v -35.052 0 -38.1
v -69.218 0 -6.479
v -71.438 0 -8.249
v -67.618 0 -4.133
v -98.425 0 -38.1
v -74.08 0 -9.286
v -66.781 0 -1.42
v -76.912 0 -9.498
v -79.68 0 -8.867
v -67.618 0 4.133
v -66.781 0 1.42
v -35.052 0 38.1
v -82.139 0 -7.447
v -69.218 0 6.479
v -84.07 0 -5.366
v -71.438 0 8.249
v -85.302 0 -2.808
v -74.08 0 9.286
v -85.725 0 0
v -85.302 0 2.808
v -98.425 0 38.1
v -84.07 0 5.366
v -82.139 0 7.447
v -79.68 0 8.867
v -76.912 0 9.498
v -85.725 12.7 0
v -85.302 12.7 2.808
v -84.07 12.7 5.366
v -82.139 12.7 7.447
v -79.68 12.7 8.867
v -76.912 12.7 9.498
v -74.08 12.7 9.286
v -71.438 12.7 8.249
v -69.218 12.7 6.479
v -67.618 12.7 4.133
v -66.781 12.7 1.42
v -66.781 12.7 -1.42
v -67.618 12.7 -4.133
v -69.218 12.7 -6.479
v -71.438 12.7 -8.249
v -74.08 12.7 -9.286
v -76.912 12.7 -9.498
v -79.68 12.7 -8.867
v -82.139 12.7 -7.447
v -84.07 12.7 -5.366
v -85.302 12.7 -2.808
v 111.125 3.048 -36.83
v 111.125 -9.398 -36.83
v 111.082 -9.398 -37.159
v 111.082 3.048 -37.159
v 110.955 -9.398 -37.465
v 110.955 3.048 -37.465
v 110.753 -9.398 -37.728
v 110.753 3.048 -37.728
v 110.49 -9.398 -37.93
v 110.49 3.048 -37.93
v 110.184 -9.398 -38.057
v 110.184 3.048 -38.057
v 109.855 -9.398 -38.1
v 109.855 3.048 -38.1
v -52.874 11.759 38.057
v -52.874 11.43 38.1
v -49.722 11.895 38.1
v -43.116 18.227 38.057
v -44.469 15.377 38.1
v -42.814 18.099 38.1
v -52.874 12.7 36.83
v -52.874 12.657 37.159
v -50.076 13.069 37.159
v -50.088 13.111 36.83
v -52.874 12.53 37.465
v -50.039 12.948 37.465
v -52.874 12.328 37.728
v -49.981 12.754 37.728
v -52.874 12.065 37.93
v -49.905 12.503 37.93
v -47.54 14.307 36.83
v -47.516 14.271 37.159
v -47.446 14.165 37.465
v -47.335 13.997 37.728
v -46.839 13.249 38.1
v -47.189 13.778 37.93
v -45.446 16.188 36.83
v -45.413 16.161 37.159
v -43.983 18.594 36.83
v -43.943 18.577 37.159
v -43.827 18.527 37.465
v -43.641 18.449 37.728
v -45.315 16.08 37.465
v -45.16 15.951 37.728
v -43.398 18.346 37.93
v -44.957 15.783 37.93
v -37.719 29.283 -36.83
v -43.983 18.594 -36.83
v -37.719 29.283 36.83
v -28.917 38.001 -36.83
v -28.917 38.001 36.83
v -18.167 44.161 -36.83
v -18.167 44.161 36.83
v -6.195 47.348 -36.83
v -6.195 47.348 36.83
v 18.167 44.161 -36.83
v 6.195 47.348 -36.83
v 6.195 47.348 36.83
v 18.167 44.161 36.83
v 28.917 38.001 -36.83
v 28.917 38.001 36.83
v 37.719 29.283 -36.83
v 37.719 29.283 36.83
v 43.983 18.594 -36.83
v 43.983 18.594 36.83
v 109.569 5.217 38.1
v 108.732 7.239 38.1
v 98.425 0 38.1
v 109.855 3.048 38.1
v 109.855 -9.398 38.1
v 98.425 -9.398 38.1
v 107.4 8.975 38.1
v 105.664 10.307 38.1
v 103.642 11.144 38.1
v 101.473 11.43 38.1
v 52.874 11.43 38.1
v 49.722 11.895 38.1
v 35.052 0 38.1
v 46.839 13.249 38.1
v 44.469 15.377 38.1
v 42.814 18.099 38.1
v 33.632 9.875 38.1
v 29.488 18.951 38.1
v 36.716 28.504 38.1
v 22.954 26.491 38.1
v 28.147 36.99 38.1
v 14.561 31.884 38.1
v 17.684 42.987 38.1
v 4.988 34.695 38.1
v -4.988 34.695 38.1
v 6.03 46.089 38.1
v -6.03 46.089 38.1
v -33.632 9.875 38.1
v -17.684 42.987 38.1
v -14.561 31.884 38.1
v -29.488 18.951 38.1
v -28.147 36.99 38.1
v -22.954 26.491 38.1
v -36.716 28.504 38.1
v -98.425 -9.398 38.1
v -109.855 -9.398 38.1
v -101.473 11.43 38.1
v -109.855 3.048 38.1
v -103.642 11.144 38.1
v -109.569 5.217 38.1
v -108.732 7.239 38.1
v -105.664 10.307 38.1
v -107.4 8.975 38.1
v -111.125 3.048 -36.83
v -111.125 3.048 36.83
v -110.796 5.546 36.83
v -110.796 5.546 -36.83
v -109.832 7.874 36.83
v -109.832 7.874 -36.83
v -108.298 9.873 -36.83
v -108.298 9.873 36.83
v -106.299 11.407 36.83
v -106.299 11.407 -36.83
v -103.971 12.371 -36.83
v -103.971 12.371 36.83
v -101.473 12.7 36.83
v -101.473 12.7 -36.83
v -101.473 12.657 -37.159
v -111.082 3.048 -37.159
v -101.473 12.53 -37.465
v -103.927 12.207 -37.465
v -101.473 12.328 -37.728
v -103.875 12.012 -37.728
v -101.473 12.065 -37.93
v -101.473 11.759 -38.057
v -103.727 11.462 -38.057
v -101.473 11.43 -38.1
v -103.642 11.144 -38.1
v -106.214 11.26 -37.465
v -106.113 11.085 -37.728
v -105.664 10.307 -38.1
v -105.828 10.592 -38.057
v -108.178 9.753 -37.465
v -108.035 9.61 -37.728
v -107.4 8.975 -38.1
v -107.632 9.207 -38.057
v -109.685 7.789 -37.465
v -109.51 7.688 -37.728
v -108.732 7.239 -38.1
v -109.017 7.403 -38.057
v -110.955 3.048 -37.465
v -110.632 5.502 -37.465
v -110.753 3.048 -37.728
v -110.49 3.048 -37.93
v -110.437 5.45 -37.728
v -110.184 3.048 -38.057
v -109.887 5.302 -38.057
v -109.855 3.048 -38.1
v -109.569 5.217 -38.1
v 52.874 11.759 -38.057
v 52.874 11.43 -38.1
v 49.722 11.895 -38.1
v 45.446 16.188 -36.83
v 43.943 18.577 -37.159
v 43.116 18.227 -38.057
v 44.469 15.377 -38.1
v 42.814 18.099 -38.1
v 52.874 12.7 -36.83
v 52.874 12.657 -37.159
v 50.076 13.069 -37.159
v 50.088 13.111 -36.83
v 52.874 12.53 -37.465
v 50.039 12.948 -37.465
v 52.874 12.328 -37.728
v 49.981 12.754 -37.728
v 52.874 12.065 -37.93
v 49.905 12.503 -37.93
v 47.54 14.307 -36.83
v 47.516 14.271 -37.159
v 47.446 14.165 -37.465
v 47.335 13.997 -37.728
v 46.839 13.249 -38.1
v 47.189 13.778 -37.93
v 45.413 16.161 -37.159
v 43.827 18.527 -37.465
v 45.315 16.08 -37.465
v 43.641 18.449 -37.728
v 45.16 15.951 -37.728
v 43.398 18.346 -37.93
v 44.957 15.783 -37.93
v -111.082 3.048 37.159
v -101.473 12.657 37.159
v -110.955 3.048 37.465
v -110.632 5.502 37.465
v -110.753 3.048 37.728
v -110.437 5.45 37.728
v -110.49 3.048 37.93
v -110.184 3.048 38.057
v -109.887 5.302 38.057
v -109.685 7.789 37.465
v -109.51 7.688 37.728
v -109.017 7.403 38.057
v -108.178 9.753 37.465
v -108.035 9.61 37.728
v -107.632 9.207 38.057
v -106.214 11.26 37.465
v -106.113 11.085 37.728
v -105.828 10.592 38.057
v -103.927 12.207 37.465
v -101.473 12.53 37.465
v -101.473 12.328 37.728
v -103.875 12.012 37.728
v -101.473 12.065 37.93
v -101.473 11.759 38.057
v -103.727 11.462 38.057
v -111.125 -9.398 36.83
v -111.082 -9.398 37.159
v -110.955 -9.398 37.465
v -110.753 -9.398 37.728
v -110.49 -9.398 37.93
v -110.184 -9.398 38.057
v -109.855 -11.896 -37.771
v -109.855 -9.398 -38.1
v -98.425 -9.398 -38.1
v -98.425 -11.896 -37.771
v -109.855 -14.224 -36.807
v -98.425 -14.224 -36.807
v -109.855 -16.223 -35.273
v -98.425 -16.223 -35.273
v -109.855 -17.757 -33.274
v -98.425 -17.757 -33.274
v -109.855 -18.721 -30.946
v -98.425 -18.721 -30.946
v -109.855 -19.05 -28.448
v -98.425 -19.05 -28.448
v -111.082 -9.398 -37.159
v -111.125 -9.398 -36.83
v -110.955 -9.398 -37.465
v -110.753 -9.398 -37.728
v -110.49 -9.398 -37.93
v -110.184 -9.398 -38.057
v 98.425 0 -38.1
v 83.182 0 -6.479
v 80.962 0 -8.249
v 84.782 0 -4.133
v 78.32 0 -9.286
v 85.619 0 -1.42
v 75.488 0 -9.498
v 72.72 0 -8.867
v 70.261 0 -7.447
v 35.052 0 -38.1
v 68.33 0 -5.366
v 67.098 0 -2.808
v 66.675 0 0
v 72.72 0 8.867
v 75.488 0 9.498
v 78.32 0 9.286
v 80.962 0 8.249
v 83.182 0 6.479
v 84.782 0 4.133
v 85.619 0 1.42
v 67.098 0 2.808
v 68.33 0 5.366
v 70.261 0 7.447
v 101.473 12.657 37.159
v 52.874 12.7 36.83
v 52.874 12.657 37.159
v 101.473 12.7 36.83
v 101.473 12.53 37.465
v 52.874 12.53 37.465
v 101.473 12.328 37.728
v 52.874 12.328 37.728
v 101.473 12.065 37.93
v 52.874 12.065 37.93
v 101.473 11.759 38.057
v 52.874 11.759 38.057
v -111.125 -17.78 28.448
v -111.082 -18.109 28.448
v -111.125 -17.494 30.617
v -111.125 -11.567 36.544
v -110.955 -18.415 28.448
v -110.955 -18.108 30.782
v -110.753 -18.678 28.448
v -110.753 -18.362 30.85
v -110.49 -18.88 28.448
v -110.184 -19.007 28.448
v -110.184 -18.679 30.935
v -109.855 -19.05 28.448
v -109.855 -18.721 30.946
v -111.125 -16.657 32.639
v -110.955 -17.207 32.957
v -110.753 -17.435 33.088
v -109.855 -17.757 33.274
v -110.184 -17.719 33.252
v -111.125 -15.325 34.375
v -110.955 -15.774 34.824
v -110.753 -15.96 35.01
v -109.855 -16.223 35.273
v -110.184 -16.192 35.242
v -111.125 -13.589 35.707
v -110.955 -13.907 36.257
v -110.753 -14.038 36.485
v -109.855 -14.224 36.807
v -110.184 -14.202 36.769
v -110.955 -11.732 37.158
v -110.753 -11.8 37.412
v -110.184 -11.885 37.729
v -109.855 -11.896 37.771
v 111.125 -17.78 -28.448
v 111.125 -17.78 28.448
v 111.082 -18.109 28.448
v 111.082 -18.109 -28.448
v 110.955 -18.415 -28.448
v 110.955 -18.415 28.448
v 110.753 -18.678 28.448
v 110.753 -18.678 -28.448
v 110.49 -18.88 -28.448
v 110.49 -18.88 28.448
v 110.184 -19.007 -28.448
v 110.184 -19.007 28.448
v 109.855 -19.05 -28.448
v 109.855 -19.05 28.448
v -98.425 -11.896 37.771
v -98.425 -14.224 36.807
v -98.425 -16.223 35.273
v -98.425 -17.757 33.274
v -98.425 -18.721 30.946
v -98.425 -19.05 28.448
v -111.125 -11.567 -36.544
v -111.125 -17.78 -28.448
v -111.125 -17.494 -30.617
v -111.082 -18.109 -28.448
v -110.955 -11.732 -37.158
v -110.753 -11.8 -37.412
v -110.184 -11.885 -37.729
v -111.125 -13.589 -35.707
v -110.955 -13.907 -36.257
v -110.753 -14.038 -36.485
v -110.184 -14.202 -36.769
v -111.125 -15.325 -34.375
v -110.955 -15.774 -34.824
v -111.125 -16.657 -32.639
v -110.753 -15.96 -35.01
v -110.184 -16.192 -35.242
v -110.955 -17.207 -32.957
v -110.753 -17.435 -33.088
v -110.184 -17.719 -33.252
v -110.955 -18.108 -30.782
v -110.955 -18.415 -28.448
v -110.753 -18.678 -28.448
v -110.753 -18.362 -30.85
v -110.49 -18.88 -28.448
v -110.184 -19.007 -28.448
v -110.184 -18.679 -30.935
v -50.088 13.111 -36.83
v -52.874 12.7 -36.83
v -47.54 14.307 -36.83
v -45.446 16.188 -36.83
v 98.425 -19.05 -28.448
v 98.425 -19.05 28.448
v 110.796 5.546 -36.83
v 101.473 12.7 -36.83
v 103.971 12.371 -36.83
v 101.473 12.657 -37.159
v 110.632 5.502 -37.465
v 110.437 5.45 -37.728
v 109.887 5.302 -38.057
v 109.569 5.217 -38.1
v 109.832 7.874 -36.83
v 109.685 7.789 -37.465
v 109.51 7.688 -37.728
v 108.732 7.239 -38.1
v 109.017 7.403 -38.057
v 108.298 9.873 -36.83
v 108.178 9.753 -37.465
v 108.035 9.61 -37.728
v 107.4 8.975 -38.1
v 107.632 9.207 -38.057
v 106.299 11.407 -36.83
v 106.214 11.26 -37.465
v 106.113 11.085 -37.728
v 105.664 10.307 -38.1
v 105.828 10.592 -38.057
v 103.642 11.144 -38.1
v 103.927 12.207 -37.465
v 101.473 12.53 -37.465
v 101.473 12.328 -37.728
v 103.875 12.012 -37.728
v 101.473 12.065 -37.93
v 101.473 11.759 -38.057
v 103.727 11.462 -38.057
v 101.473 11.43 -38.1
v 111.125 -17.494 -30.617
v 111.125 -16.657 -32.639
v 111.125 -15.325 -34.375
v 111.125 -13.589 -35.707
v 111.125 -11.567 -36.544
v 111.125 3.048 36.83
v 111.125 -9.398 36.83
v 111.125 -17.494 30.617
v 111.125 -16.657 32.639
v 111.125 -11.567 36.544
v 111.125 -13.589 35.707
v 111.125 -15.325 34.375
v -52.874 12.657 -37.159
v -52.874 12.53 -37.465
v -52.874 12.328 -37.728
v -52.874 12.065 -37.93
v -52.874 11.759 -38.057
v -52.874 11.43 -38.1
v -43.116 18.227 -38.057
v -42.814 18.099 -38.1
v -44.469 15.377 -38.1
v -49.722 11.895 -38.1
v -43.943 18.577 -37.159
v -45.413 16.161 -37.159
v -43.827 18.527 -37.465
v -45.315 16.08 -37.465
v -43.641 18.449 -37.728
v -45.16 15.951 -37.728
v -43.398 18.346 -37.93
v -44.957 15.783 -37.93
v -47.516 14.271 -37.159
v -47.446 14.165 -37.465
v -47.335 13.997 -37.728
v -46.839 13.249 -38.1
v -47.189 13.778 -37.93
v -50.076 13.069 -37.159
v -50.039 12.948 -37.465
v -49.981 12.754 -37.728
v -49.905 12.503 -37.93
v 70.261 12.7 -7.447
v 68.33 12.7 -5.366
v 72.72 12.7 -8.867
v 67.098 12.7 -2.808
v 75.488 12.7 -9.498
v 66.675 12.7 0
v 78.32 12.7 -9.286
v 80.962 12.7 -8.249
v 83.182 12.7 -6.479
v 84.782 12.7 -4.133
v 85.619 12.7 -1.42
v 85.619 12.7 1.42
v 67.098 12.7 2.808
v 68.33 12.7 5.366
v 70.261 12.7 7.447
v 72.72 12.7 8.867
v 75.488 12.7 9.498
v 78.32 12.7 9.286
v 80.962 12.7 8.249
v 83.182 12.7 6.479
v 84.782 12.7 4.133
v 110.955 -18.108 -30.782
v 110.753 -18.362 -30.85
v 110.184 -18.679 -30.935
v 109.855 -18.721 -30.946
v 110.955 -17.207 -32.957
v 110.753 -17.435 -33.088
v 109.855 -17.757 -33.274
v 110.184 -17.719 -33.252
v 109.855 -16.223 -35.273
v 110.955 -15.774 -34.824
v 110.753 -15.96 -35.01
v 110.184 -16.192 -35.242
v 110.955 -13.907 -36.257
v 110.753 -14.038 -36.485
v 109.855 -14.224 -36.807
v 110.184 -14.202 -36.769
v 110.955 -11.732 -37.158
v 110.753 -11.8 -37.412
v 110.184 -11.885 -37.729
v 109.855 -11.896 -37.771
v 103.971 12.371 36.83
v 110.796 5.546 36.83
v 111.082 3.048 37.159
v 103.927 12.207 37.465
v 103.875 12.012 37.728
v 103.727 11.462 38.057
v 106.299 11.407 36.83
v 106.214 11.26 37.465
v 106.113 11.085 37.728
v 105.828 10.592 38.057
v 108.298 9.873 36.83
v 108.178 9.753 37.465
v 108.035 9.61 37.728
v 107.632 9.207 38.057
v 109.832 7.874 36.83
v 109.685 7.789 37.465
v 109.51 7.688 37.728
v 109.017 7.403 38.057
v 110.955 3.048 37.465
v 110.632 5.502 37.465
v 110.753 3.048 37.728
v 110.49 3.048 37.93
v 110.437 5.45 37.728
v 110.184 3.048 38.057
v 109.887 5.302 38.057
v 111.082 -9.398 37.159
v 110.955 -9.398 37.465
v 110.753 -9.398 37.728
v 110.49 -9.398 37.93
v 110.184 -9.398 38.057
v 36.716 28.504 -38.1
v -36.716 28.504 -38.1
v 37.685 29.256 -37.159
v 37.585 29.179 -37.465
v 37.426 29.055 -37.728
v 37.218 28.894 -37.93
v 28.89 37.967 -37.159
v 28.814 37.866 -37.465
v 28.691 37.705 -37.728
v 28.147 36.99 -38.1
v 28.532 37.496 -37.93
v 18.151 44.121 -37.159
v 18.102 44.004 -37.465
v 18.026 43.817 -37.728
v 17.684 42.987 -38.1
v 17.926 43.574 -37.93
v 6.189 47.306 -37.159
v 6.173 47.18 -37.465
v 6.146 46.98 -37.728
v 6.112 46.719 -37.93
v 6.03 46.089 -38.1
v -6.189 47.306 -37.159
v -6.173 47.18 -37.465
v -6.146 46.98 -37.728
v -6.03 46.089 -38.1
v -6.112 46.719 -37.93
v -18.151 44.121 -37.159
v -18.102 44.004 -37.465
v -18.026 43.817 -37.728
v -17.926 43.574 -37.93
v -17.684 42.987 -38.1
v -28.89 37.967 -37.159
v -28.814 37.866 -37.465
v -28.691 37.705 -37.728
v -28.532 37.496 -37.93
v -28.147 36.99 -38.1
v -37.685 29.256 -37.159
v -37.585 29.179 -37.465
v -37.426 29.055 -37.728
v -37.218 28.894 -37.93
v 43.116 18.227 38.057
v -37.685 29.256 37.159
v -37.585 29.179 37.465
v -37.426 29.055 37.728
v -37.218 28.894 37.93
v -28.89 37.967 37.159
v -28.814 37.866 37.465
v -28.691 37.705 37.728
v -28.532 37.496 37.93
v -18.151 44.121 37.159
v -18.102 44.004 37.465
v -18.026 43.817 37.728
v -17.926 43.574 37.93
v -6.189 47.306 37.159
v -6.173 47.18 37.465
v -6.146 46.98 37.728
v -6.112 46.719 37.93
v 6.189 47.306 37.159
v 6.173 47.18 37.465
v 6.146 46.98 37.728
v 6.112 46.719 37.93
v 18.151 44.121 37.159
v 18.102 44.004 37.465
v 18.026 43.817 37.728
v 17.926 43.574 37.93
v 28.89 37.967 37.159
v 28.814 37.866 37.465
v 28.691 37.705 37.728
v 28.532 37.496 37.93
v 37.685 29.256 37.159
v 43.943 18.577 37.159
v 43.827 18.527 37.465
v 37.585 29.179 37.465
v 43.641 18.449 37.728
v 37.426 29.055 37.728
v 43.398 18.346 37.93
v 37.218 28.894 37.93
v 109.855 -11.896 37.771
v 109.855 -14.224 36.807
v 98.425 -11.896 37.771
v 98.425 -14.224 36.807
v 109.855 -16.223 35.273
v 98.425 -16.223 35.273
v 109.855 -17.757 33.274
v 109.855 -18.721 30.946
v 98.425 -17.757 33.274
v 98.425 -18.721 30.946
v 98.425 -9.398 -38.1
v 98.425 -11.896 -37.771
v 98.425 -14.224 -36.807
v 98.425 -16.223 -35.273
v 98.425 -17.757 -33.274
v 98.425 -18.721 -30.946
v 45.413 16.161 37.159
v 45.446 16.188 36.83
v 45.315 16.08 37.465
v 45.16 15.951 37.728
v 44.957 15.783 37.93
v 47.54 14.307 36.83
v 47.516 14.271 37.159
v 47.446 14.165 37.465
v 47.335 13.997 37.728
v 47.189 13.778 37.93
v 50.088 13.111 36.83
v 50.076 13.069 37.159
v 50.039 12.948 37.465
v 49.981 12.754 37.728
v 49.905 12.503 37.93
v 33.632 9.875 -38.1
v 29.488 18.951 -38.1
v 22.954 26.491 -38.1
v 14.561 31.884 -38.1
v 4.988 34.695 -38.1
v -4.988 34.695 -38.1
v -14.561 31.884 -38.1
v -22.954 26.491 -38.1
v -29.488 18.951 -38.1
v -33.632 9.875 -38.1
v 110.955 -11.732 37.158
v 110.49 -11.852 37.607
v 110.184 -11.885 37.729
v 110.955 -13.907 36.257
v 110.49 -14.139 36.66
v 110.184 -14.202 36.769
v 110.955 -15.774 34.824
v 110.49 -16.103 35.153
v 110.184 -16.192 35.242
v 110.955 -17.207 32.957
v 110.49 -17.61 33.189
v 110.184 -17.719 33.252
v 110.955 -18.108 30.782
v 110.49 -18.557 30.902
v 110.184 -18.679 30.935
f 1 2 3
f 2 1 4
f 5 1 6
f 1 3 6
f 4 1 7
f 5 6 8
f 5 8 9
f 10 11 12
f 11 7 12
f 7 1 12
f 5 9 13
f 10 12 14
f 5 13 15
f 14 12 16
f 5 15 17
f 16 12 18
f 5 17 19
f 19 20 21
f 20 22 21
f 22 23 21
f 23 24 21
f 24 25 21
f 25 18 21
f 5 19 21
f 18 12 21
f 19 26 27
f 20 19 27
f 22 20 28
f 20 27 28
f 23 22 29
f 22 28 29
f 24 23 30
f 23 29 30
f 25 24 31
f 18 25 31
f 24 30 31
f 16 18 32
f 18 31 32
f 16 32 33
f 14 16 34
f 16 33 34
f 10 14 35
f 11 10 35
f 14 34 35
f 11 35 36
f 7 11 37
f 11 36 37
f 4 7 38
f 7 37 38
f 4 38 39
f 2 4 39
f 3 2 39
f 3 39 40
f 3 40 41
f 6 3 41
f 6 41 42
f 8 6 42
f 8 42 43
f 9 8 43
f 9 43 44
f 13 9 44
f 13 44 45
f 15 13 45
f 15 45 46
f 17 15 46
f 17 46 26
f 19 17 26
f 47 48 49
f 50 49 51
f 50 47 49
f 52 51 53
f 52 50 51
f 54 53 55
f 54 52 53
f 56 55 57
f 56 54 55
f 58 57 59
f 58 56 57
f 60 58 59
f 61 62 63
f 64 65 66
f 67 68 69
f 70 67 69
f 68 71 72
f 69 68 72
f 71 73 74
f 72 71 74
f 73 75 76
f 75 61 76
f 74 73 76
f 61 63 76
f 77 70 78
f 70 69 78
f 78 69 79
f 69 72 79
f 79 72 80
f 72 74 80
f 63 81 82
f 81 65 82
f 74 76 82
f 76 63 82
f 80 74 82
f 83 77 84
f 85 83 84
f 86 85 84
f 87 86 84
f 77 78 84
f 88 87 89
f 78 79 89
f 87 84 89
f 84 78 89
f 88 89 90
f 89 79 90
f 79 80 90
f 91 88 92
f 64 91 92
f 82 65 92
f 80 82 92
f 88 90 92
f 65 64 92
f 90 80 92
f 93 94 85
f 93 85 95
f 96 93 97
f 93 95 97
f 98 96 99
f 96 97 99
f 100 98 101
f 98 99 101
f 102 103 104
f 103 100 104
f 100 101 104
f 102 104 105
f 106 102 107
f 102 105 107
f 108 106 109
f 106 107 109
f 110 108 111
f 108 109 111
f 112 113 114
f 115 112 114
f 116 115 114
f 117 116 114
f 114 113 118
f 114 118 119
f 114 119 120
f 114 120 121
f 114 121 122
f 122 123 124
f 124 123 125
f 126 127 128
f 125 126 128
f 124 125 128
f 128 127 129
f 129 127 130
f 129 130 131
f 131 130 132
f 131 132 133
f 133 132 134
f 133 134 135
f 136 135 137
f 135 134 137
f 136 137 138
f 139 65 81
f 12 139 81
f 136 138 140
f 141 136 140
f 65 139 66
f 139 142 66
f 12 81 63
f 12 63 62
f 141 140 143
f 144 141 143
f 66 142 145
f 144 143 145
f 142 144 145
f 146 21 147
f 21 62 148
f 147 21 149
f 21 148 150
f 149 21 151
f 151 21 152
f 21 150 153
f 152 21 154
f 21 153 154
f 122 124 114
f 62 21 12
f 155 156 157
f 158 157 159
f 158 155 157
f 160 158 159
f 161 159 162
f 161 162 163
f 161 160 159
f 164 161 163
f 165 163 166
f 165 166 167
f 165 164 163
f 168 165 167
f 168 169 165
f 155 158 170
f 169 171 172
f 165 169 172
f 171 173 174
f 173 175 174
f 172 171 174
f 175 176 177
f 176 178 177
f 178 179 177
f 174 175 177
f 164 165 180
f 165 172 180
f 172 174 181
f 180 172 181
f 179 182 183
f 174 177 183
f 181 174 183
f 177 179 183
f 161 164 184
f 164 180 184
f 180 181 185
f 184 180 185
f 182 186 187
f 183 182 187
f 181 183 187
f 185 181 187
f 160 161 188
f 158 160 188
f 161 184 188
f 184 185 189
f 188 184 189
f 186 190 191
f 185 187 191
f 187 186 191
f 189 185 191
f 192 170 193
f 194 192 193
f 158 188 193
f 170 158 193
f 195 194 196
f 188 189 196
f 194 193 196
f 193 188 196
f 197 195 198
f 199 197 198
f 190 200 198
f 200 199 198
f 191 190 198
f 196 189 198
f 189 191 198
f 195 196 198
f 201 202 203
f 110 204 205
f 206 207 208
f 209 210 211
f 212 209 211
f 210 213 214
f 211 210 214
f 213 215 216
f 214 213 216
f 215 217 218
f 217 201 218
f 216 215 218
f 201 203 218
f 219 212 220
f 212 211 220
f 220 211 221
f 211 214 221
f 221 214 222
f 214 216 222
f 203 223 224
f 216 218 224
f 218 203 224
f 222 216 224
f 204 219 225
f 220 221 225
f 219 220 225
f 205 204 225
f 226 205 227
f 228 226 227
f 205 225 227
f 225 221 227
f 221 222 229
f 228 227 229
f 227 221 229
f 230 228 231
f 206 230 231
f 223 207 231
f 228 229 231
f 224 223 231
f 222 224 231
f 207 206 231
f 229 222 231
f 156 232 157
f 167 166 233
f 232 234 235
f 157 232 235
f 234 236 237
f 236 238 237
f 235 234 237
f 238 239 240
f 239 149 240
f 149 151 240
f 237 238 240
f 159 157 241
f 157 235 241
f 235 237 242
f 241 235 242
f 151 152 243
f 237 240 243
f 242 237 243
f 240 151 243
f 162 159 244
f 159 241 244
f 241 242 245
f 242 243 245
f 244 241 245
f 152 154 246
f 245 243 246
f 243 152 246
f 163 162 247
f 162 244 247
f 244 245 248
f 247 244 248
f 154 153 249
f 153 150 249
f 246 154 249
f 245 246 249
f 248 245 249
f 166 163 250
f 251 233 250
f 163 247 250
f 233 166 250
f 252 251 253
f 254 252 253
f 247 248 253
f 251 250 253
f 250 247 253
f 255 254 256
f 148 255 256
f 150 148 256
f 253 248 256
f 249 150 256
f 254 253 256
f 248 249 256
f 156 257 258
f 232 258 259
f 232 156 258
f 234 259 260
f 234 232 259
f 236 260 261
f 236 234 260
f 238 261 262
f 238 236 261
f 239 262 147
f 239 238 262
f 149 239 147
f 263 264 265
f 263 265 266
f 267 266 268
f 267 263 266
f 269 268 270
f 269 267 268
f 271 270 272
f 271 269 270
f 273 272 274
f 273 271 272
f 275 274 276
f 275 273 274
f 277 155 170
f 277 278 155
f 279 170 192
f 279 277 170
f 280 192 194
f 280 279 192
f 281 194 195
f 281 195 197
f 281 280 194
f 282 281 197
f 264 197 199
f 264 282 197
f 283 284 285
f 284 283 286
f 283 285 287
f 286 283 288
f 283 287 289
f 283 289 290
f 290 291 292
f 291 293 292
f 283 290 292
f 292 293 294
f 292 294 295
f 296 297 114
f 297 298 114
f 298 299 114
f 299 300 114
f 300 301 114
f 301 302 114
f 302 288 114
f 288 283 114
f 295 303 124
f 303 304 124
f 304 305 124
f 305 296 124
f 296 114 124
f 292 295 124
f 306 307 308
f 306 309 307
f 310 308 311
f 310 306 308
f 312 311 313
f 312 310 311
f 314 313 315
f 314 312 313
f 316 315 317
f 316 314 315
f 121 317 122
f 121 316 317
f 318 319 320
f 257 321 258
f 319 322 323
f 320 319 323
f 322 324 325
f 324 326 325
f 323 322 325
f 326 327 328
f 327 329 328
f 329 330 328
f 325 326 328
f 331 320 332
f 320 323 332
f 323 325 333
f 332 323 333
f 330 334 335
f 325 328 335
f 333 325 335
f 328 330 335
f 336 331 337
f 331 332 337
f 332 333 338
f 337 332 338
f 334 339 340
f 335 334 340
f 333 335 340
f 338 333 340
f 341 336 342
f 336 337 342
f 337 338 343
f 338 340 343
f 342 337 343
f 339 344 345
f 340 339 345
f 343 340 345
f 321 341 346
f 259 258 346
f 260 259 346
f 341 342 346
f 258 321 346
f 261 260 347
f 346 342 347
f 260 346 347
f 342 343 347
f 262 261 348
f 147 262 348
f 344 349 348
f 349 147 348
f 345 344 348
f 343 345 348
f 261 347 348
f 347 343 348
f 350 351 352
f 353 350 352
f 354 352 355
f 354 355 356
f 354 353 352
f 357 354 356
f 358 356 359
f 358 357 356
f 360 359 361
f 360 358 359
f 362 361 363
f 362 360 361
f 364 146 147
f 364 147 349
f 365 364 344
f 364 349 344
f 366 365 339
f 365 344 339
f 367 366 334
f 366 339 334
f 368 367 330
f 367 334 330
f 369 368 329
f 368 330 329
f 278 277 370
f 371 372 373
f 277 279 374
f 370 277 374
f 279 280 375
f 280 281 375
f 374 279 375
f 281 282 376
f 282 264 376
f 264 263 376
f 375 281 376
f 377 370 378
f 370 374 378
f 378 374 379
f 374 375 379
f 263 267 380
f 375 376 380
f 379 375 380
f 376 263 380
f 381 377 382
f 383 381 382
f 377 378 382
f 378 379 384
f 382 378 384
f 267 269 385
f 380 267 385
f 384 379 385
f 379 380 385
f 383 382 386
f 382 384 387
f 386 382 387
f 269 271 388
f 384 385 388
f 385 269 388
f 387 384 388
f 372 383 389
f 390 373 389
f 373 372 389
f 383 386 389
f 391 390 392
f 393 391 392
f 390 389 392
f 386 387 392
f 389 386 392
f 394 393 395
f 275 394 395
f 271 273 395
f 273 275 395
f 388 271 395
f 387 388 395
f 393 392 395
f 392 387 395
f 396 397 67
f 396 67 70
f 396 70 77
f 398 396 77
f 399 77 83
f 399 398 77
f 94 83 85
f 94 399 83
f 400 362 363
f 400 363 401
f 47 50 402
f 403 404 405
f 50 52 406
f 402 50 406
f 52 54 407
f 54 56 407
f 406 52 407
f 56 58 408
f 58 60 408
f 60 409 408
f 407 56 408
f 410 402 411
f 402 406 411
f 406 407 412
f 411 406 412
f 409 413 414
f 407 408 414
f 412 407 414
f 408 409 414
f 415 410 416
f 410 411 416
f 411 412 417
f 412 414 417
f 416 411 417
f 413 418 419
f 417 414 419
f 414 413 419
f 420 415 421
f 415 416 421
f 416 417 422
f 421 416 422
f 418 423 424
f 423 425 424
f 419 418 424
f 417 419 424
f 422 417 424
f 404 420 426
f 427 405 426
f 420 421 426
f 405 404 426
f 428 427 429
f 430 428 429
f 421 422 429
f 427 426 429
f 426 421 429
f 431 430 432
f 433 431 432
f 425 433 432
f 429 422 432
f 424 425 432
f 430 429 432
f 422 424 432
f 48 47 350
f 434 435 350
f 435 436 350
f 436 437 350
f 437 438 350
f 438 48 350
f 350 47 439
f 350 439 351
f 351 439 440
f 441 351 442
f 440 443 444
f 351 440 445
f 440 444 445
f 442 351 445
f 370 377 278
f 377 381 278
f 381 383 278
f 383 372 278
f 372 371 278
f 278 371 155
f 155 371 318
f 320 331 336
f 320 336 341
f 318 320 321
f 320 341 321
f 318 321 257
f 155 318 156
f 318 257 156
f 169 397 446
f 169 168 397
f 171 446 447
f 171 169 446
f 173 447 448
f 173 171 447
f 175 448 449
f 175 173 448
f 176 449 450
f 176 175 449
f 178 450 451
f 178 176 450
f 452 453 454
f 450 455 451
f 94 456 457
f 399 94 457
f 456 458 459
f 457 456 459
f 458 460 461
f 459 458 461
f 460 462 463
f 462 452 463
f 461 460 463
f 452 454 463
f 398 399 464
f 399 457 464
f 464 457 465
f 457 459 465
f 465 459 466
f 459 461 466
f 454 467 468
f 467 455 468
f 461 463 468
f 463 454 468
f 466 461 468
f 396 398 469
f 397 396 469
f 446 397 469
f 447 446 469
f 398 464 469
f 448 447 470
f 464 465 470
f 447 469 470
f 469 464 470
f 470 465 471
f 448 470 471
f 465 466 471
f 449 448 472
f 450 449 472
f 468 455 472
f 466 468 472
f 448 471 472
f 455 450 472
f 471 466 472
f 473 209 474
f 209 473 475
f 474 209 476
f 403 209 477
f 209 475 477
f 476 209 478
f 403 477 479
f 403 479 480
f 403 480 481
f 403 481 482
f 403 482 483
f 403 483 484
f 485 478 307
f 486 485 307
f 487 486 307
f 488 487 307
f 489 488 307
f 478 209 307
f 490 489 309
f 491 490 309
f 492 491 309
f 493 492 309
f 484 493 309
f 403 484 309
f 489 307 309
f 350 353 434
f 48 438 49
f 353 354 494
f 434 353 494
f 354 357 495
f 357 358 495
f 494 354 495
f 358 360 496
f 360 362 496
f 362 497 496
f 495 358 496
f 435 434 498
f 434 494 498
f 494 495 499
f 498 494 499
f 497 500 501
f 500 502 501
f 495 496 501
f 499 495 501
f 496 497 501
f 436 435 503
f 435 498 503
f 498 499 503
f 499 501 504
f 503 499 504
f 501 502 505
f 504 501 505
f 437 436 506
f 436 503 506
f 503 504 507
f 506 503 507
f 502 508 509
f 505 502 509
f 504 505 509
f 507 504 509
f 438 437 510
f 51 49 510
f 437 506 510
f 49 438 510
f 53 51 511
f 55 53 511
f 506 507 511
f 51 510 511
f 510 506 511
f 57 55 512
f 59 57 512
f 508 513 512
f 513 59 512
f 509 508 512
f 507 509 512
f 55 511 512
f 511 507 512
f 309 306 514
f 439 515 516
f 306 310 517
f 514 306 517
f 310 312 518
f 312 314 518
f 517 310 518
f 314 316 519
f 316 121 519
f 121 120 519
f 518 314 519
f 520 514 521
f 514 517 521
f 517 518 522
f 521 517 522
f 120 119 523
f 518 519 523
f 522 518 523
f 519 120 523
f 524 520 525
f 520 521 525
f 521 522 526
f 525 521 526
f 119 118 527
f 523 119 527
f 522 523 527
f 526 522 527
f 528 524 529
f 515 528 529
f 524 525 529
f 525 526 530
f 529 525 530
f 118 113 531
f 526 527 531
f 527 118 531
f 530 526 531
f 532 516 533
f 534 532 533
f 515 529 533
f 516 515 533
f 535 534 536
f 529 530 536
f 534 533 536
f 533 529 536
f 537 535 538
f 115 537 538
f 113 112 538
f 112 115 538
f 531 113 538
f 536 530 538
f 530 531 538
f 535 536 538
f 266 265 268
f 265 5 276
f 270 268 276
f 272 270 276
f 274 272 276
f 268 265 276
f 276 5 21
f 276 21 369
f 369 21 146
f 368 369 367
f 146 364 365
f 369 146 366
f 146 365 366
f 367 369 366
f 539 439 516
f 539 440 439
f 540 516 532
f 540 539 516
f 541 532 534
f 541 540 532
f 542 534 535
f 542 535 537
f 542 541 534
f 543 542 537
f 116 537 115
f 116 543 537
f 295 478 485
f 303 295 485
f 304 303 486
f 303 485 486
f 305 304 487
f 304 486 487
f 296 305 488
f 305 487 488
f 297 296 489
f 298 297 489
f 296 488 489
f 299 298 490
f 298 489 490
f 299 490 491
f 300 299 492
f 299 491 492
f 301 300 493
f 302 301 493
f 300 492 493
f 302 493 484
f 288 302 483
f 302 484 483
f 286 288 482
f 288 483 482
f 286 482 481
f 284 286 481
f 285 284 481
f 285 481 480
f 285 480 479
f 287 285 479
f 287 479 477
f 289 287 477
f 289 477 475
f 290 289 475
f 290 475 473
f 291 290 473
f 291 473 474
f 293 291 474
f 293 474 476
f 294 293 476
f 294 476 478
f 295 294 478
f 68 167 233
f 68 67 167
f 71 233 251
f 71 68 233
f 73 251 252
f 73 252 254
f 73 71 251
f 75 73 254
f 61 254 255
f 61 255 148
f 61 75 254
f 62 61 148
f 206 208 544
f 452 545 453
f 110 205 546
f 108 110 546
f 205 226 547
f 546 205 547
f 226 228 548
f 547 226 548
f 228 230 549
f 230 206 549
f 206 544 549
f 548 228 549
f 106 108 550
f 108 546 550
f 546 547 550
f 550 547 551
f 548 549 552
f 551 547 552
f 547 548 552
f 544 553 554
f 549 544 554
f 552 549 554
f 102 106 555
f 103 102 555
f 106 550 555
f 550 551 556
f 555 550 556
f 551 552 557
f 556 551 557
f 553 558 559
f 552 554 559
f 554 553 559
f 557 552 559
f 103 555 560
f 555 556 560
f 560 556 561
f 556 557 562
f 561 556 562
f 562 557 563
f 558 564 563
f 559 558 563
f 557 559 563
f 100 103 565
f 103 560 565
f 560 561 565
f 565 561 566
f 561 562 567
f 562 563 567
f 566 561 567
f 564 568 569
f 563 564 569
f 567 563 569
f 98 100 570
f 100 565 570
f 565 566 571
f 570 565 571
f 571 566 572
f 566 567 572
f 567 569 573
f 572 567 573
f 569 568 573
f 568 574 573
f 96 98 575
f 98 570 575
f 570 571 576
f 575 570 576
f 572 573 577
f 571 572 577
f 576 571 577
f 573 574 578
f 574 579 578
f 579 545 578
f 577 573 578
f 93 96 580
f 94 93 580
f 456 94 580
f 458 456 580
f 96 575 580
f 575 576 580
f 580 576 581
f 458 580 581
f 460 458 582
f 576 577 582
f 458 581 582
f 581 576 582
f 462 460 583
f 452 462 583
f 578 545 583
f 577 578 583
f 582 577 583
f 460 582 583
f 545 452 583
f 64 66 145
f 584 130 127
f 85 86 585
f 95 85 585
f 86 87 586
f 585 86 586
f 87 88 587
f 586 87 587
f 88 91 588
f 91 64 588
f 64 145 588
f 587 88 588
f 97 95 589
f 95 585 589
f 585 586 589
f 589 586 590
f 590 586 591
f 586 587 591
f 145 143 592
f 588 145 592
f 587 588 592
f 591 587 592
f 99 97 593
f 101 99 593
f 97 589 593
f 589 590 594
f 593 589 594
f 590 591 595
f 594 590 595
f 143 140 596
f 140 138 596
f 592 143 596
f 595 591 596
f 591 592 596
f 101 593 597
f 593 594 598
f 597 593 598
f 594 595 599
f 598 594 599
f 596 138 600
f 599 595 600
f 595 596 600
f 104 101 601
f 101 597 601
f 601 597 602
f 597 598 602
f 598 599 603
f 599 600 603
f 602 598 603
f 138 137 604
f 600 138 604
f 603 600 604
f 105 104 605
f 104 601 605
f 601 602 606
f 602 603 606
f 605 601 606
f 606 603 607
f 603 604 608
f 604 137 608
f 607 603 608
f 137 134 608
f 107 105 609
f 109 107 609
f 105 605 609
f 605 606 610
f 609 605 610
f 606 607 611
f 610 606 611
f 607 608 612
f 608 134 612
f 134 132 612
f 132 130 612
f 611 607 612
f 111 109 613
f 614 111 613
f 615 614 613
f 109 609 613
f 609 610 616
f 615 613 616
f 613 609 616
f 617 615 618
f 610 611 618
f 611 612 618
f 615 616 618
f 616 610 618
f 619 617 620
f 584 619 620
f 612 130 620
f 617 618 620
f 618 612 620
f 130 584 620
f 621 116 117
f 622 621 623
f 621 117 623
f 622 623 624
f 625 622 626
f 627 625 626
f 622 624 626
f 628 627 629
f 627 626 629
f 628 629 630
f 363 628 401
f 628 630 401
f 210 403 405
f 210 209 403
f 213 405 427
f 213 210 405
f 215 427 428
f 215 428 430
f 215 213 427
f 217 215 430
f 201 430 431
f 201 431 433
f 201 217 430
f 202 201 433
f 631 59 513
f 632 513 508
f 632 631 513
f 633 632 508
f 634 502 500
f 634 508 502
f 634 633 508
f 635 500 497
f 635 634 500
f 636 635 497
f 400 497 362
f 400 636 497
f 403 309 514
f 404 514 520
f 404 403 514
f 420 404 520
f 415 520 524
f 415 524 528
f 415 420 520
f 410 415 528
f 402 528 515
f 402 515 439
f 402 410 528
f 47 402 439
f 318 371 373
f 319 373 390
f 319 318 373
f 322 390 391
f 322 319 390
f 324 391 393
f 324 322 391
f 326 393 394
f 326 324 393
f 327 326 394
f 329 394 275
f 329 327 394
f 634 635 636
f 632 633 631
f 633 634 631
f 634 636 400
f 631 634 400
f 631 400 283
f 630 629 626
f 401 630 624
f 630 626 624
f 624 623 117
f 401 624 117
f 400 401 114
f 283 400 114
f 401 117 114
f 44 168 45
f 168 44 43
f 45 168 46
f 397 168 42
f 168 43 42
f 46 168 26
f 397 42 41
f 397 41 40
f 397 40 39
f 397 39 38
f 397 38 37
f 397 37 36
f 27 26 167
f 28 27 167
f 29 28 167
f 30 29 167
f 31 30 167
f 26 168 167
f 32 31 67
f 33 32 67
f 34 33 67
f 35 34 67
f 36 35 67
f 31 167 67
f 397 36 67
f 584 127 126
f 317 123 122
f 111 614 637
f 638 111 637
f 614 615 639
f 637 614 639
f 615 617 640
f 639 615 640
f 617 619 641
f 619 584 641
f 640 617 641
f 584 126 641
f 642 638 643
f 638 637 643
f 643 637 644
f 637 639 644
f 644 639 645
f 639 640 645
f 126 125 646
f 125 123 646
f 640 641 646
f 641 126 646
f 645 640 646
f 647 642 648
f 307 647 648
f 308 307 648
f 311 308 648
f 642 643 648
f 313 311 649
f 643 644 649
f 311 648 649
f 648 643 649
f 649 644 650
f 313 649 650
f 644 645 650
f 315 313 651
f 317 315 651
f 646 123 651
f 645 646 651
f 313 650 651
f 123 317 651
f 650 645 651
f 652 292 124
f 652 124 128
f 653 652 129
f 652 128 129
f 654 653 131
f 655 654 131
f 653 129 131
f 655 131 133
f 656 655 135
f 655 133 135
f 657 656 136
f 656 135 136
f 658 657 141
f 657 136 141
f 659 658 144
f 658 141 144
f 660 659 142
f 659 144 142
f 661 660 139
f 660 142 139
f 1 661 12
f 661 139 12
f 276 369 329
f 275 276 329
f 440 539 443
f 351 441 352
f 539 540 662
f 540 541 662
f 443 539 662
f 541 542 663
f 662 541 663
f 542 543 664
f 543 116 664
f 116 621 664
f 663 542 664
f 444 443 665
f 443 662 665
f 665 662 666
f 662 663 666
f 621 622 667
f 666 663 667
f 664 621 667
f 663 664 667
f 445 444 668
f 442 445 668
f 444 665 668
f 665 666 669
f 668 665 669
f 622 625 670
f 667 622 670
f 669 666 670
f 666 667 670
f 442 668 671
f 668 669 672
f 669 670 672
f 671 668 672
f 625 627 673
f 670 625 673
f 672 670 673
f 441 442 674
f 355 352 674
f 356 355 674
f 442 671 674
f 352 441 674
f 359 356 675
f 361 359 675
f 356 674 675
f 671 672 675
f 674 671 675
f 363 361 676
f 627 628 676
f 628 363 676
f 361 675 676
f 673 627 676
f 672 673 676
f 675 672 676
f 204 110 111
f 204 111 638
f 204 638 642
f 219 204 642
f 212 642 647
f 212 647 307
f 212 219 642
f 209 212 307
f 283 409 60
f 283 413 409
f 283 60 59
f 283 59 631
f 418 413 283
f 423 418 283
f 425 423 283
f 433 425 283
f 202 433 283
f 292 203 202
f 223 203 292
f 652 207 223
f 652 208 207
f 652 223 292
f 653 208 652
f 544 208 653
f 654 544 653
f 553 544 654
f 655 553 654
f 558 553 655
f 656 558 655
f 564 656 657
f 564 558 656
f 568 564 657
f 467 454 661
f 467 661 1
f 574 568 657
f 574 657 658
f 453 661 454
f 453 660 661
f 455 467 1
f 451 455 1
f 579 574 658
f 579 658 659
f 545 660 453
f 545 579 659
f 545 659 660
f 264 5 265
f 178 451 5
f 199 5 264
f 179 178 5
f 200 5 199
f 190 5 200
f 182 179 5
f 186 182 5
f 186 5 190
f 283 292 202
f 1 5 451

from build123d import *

# Parameters (mm, degrees)
BOSS_EXTRUDE1_DEPTH = 38.1
SKETCH3_R           = 9.525
CUT_EXTRUDE1_DEPTH  = 123.592896731
FILLET1_R           = 9.652
FILLET2_R           = 1.27


with BuildPart() as part:
    # Sketch1 → Boss-Extrude1 (new, symmetric)
    with BuildSketch(Plane.XY):
        with BuildLine():
            Line((-35.052, 0), (-98.425, 0))
            Line((-98.425, 0), (-98.425, -19.05))
            Line((-98.425, -19.05), (-111.125, -19.05))
            Line((-111.125, -19.05), (-111.125, 12.7))
            Line((-111.125, 12.7), (-46.032200729, 12.7))
            ThreePointArc((-46.032200729, 12.7), (0, 47.752), (46.032200729, 12.7))
            Line((46.032200729, 12.7), (111.125, 12.7))
            Line((111.125, 12.7), (111.125, -19.05))
            Line((111.125, -19.05), (98.425, -19.05))
            Line((98.425, -19.05), (98.425, 0))
            Line((98.425, 0), (35.052, 0))
            ThreePointArc((35.052, 0), (0, 35.052), (-35.052, 0))
        make_face()
    extrude(amount=BOSS_EXTRUDE1_DEPTH, both=True)

    # Sketch3 → Cut-Extrude1 (cut, through all)
    with BuildSketch(Plane(origin=(0, 12.7, 0), x_dir=(1, 0, 0), z_dir=(0, 1, 0))):
        with Locations(Location((-76.2, 0, 0), (0, 0, 180))):
            Circle(SKETCH3_R)
        with Locations(Location((76.2, 0, 0), (0, 0, 180))):
            Circle(SKETCH3_R)
    extrude(amount=-CUT_EXTRUDE1_DEPTH, mode=Mode.SUBTRACT)

    # Fillet1
    fillet1_edges = [part.edges().sort_by_distance(p)[0] for p in [
        (-104.775, -19.05, -38.1),
        (104.775, -19.05, -38.1),
        (104.775, -19.05, 38.1),
        (-111.125, 12.7, 0),
        (-46.032200729, 12.7, 0),
        (46.032200729, 12.7, 0),
        (111.125, 12.7, 0),
        (-104.775, -19.05, 38.1),
    ]]
    fillet(fillet1_edges, radius=FILLET1_R)

    # Fillet2
    fillet2_edges = [part.edges().sort_by_distance(p)[0] for p in [
        (111.125, -19.05, 0),
        (111.125, -3.175, -38.1),
        (111.125, -3.175, 38.1),
        (111.125, -16.222994652, 35.272994652),
        (111.125, -16.222994652, -35.272994652),
        (-111.125, -3.175, -38.1),
        (-77.173251465, 12.7, -38.1),
        (0, 47.752, -38.1),
        (77.173251465, 12.7, -38.1),
        (108.297994652, 9.872994652, -38.1),
        (-108.297994652, 9.872994652, -38.1),
        (-111.125, -19.05, 0),
        (-111.125, -3.175, 38.1),
        (-111.125, -16.222994652, 35.272994652),
        (-111.125, -16.222994652, -35.272994652),
        (-77.173251465, 12.7, 38.1),
        (0, 47.752, 38.1),
        (77.173251465, 12.7, 38.1),
        (108.297994652, 9.872994652, 38.1),
        (-108.297994652, 9.872994652, 38.1),
        (-47.540305771, 14.307243194, -38.1),
        (-47.540305771, 14.307243194, 38.1),
        (47.540305771, 14.307243194, -38.1),
        (47.540305771, 14.307243194, 38.1),
    ]]
    fillet(fillet2_edges, radius=FILLET2_R)


solid = part.part
